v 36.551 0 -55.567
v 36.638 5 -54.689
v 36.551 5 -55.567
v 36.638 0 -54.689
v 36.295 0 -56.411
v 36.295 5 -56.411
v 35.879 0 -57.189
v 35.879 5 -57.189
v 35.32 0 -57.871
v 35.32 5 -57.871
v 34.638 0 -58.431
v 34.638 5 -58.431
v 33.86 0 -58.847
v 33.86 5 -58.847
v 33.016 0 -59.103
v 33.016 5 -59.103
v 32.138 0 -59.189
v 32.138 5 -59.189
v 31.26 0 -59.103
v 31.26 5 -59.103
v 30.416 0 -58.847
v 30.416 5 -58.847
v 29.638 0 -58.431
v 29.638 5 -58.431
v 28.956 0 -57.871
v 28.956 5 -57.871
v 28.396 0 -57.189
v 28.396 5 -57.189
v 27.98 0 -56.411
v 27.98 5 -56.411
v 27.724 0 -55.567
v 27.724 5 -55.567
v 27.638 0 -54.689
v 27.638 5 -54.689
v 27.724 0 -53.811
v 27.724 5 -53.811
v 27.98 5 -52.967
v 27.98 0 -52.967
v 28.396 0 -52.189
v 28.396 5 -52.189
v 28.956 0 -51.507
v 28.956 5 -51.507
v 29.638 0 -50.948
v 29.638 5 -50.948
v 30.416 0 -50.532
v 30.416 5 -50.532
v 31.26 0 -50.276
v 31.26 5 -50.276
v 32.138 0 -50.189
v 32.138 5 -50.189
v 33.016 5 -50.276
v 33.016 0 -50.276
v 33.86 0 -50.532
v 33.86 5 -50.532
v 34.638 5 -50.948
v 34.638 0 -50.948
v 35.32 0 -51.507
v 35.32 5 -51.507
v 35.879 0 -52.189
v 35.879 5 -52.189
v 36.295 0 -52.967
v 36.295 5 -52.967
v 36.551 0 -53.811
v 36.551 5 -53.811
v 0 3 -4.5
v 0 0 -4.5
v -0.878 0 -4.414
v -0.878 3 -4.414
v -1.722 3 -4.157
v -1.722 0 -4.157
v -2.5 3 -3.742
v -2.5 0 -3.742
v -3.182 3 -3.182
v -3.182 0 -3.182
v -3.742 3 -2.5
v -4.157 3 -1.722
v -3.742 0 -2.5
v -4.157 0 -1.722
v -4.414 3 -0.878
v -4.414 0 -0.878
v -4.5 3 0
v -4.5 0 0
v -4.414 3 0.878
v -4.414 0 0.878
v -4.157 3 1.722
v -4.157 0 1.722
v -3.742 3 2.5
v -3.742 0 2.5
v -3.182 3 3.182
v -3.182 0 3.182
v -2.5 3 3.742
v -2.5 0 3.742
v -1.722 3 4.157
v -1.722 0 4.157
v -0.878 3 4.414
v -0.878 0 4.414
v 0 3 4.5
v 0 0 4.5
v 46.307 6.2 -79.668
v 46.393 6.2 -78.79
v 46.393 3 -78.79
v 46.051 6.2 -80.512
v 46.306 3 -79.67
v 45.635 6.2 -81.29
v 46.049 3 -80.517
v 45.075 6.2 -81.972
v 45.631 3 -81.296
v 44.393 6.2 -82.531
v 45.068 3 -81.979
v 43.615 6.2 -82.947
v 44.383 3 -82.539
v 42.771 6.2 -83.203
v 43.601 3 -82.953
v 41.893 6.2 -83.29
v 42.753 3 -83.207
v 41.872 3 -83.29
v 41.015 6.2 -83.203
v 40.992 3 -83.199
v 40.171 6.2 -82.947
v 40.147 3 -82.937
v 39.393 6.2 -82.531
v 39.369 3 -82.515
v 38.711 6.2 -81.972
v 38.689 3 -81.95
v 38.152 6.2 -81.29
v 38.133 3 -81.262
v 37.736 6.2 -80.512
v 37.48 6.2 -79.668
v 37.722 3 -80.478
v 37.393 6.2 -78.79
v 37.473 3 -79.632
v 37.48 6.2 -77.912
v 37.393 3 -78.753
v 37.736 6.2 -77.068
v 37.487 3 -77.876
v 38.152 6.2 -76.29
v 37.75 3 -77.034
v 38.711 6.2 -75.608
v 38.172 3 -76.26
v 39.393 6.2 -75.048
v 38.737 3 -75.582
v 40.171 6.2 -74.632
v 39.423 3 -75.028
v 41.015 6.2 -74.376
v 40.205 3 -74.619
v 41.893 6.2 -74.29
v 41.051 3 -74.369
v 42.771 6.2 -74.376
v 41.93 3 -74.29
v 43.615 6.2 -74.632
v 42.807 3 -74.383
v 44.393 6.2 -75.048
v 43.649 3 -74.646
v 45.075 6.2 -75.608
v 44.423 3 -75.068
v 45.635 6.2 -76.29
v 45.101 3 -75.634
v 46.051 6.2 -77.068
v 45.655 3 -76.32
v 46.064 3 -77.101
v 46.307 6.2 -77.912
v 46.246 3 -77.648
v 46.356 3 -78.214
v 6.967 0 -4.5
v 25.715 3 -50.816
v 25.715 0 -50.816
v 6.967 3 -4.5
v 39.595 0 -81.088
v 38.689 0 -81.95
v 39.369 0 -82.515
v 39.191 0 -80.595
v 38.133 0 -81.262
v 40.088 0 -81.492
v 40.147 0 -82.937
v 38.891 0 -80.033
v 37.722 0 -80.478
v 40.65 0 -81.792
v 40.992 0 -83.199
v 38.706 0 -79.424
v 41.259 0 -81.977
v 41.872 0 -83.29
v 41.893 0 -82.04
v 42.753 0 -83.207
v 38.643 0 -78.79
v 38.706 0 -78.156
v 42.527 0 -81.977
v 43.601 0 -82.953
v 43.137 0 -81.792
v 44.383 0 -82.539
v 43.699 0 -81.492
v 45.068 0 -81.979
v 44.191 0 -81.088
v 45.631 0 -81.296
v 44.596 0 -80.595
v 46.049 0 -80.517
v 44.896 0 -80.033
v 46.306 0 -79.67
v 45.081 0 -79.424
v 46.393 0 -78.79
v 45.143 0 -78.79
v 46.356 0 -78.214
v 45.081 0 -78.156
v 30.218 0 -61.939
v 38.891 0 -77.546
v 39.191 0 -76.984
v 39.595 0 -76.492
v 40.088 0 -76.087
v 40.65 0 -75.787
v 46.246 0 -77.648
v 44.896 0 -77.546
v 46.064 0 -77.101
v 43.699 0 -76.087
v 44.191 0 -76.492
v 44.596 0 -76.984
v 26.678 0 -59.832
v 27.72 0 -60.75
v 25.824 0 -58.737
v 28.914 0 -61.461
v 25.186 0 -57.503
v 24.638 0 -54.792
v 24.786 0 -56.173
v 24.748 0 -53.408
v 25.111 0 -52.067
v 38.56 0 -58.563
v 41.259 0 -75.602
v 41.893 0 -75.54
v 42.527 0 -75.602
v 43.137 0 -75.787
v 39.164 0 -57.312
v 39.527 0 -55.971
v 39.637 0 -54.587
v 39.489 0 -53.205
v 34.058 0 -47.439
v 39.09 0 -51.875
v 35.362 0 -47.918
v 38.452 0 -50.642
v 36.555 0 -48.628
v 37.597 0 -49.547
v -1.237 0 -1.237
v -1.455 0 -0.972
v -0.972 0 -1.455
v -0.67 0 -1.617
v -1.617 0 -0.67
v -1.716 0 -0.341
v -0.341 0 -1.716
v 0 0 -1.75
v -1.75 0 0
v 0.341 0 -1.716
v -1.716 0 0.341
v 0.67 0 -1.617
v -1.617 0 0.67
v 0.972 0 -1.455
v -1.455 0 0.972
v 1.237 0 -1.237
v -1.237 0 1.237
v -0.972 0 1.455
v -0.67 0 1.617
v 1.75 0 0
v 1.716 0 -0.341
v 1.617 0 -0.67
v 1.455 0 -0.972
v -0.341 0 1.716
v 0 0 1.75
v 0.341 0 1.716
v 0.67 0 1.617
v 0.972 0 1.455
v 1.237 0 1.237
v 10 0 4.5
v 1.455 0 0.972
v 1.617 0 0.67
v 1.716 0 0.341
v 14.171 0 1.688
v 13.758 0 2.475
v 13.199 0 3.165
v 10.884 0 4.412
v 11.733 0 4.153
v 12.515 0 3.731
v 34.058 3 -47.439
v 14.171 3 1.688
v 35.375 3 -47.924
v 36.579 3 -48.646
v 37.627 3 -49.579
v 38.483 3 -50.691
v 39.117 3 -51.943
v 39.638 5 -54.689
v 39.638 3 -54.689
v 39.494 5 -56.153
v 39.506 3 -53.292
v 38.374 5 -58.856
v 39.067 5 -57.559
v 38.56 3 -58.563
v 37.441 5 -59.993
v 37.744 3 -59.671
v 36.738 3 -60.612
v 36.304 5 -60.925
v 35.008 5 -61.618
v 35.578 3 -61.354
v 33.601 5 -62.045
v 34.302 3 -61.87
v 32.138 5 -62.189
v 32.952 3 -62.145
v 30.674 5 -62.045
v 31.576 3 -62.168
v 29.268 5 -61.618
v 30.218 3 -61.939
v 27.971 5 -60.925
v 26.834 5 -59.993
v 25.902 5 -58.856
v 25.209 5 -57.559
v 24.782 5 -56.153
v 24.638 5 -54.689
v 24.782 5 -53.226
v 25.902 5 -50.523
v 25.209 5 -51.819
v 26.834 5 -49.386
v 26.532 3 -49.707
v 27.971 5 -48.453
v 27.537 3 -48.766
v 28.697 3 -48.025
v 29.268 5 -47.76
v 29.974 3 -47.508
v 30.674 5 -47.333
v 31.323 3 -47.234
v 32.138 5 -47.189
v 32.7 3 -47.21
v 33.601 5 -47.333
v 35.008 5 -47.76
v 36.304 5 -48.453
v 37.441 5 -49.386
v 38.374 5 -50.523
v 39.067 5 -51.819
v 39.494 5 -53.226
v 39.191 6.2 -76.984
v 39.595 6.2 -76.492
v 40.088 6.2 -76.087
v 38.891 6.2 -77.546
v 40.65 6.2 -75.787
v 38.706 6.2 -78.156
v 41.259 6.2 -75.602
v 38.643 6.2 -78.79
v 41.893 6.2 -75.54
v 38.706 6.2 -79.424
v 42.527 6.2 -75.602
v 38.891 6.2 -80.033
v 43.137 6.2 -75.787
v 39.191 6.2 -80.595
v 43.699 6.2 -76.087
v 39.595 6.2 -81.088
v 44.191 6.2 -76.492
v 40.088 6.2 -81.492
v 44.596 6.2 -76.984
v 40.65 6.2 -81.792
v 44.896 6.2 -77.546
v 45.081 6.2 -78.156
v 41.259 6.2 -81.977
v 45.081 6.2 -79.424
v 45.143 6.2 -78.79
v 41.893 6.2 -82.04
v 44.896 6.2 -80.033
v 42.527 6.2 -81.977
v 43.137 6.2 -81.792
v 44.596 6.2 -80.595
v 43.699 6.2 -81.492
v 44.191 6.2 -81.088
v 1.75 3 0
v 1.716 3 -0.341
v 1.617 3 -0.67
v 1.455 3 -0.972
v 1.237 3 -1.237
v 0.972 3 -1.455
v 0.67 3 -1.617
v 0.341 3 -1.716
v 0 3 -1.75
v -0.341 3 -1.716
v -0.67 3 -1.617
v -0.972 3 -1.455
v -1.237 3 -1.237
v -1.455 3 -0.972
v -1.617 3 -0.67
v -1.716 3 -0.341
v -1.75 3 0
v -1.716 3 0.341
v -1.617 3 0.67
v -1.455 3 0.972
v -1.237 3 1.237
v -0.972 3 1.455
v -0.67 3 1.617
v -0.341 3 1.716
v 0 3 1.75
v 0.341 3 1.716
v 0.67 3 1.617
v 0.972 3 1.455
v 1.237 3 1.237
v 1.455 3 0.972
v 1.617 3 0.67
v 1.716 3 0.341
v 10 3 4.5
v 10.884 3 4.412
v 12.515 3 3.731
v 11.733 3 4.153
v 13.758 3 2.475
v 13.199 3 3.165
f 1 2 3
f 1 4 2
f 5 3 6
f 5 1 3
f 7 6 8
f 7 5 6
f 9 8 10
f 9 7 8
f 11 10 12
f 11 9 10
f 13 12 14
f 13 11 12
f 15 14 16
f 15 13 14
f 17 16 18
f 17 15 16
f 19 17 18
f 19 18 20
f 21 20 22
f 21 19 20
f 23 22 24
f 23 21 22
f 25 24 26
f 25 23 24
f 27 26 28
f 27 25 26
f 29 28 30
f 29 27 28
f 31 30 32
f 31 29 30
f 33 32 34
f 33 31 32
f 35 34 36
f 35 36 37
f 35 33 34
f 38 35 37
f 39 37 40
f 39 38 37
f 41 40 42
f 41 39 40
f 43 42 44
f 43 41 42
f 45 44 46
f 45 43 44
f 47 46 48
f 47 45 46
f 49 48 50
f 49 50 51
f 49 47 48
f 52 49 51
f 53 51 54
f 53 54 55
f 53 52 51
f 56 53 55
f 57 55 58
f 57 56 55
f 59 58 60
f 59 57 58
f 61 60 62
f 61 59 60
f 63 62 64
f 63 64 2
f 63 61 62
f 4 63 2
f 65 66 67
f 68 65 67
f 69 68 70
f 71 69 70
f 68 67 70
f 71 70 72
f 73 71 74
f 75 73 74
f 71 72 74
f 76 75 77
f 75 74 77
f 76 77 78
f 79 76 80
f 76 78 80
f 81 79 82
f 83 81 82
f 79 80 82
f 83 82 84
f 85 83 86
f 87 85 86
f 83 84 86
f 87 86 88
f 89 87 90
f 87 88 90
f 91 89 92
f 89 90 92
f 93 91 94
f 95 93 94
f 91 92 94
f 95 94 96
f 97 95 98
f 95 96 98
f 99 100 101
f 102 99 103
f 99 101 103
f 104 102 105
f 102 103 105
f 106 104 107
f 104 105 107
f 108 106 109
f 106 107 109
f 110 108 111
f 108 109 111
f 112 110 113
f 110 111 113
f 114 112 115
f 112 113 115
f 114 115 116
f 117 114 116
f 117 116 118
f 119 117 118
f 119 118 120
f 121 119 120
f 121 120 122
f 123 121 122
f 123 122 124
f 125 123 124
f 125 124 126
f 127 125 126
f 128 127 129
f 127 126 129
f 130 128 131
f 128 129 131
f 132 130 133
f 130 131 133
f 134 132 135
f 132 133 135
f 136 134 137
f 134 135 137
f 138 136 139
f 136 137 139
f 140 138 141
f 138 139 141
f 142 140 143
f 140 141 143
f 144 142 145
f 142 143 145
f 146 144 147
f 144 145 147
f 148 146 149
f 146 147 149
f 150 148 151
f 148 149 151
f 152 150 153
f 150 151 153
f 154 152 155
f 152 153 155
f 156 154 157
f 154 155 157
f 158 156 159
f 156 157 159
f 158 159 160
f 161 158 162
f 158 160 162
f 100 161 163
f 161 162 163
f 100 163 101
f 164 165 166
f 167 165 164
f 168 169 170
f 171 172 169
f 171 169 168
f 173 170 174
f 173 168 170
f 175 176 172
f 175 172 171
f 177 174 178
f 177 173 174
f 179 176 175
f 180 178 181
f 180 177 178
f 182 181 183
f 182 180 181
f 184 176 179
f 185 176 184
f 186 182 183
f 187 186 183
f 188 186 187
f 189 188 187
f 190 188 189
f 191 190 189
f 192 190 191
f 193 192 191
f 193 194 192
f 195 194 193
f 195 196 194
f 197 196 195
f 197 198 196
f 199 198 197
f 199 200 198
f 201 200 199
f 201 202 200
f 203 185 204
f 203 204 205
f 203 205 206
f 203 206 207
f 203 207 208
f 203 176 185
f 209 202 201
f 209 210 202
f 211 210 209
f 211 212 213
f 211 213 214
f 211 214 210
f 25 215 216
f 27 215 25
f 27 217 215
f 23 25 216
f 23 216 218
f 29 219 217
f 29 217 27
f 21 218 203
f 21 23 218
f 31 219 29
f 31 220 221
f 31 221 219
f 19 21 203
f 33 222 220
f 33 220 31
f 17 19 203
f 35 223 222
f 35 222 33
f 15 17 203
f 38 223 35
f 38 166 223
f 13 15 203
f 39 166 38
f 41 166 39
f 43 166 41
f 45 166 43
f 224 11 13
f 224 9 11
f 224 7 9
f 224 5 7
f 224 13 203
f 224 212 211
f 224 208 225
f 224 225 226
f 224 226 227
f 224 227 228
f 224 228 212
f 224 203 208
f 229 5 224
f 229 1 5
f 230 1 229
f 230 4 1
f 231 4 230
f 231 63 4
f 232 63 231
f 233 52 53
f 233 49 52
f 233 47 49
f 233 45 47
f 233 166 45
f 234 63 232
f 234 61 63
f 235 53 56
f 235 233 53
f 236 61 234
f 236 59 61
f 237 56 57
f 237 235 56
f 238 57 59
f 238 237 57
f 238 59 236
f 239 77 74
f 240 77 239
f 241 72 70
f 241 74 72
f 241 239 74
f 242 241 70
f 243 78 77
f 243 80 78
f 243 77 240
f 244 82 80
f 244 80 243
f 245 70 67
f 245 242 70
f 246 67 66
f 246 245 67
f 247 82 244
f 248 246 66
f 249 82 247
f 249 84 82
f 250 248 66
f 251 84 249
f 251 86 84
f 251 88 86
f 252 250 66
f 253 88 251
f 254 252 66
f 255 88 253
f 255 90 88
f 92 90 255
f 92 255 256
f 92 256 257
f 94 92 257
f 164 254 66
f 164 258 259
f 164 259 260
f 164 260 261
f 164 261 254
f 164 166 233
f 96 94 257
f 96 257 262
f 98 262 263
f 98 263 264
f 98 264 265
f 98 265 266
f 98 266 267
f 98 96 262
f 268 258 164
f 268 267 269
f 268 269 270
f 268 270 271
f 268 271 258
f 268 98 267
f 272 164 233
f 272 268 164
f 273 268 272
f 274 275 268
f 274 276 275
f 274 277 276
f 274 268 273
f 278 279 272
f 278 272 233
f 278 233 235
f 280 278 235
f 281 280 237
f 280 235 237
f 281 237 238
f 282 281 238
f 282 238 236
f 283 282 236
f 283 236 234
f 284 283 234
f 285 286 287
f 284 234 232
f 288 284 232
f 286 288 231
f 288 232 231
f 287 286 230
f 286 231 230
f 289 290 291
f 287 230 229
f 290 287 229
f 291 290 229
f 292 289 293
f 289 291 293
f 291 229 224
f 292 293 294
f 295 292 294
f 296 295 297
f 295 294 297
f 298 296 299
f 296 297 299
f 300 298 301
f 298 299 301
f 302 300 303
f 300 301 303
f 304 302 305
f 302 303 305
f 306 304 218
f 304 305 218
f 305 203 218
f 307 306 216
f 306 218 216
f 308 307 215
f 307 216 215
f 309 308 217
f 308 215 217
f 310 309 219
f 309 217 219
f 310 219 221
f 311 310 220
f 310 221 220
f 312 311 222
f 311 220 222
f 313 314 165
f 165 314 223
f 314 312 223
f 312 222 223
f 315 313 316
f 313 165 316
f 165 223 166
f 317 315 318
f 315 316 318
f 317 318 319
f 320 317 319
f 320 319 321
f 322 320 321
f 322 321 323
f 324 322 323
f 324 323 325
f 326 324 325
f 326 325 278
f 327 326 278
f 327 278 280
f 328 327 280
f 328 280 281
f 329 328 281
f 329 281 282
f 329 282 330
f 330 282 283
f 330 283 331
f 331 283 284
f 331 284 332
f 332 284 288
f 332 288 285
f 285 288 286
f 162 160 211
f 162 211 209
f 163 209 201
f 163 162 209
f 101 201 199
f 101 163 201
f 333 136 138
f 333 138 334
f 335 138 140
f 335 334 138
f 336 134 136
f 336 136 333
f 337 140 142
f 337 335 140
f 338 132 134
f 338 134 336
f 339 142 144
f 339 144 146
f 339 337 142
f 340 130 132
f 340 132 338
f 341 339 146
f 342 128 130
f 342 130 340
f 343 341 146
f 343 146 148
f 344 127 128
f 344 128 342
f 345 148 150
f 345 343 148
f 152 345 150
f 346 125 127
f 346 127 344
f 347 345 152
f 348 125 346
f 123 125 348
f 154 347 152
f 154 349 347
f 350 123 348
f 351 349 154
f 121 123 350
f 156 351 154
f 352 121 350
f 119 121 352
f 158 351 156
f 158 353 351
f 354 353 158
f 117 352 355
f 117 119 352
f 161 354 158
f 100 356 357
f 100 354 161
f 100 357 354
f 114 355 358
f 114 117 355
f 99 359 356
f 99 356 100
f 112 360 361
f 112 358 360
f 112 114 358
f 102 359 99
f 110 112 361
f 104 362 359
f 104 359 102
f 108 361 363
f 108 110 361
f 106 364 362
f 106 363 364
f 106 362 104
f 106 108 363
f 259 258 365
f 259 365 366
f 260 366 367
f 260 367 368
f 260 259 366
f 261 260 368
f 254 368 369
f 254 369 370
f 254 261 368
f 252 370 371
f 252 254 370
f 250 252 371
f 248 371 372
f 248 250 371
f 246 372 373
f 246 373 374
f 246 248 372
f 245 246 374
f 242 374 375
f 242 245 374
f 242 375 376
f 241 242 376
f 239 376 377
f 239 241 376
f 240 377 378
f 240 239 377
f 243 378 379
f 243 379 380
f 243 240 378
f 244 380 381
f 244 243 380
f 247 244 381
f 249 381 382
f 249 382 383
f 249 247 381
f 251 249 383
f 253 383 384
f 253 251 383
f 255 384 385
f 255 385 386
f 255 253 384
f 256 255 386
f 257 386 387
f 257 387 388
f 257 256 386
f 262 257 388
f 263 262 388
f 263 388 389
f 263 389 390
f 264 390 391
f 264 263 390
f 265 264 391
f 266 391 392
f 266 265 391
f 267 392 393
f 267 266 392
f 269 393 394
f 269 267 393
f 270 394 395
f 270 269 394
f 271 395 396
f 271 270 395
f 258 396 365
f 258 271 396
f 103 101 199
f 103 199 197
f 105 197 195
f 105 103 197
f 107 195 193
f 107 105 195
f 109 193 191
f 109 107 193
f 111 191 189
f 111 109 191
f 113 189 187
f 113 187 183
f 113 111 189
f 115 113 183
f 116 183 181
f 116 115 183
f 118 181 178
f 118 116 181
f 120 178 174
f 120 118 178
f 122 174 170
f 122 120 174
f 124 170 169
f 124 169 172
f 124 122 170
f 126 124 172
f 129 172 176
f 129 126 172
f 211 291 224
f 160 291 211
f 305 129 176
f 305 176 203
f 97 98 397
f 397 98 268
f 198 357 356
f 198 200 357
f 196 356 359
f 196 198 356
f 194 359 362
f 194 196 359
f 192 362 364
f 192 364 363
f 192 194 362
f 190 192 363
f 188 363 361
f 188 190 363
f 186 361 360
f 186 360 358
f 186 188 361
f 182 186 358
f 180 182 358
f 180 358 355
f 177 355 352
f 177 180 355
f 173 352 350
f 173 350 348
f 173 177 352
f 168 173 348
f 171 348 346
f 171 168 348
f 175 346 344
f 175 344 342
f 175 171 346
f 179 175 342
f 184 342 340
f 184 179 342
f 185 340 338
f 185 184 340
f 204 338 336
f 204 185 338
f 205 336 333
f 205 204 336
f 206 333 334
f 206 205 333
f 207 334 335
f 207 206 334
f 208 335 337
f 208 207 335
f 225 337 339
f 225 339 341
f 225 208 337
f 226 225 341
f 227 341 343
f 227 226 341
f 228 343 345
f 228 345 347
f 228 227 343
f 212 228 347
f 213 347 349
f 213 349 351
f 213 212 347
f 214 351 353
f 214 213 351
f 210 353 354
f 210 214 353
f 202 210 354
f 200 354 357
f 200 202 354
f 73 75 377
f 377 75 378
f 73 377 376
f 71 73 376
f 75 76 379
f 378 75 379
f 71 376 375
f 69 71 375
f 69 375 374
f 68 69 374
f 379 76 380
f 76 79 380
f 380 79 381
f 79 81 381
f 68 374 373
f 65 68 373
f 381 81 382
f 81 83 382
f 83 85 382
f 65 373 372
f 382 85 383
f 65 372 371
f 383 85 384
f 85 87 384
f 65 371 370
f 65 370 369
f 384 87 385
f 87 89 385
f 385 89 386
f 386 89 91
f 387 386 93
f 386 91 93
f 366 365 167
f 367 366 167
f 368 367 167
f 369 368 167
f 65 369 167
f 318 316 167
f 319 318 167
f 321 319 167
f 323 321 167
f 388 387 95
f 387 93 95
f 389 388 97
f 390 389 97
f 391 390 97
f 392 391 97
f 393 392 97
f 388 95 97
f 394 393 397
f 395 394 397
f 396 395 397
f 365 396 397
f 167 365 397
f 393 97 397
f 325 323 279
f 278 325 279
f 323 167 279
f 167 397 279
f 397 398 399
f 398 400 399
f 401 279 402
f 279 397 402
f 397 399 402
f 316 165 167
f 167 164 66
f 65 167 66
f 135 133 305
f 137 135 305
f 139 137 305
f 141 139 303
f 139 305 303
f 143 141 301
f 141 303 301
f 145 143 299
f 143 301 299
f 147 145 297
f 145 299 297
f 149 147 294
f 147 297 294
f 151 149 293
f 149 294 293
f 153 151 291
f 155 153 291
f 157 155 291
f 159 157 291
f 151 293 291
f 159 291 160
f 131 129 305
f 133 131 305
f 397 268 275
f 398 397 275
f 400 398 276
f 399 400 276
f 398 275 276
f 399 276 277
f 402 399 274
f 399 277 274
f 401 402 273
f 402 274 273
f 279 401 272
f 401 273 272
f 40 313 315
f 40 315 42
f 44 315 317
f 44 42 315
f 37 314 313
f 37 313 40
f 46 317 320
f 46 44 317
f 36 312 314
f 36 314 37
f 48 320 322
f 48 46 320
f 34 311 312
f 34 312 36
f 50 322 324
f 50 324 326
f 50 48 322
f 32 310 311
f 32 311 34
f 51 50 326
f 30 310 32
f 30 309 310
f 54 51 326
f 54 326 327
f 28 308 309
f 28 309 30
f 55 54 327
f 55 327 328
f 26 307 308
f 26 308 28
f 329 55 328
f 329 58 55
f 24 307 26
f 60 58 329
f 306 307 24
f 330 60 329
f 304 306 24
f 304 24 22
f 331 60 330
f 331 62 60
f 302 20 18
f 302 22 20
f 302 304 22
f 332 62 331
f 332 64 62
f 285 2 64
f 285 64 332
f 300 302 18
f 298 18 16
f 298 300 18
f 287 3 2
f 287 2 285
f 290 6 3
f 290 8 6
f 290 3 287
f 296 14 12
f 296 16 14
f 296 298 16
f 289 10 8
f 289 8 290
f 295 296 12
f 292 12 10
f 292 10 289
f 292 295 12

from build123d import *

# Parameters (mm, degrees)
SKETCH1_R           = 1.75
BOSS_EXTRUDE1_DEPTH = 3
BOSS_EXTRUDE2_DEPTH = 3
SKETCH3_R           = 4.5
SKETCH3_R_2         = 3.25
BOSS_EXTRUDE3_DEPTH = 3.2
SKETCH4_R           = 3.25
CUT_EXTRUDE1_DEPTH  = 3
SKETCH6_R           = 7.5
BOSS_EXTRUDE4_DEPTH = 3
SKETCH5_R           = 4.5
CUT_EXTRUDE2_DEPTH  = 7.2
SKETCH7_R           = 7.5
SKETCH7_R_2         = 4.5
BOSS_EXTRUDE5_DEPTH = 2


with BuildPart() as part:
    # Sketch1 → Boss-Extrude1 (new body)
    with BuildSketch(Plane(origin=(0, 0, 0), x_dir=(1, 0, 0), z_dir=(0, 1, 0))):
        with BuildLine():
            Line((0, -4.5), (10, -4.5))
            ThreePointArc((10, -4.5), (14.5, 0), (10, 4.5))
            Line((10, 4.5), (0, 4.5))
            ThreePointArc((0, 4.5), (-4.5, 0), (0, -4.5))
        make_face()
        Circle(SKETCH1_R, mode=Mode.SUBTRACT)
    extrude(amount=BOSS_EXTRUDE1_DEPTH)

    # Sketch2 → Boss-Extrude2 (add)
    with BuildSketch(Plane(origin=(0, 3, 0), x_dir=(1, 0, 0), z_dir=(0, 1, 0))):
        with BuildLine():
            Line((10, 0), (11.688465713, 4.171220869))
            ThreePointArc((11.688465713, 4.171220869), (10.860088975, 4.41704052), (10, 4.5))
            Line((10, 4.5), (6.96685822, 4.5))
            ThreePointArc((6.96685822, 4.5), (8.346615874, -1.181489024), (14.171220869, -1.688465713))
            Line((14.171220869, -1.688465713), (10, 0))
        make_face()
        with BuildLine():
            ThreePointArc((46.064462111, 77.10126181), (43.648814249, 74.646303405), (40.204775529, 74.618506654))
            Line((40.204775529, 74.618506654), (11.688465713, 4.171220869))
            ThreePointArc((11.688465713, 4.171220869), (14.143424118, 1.755573007), (14.171220869, -1.688465713))
            Line((14.171220869, -1.688465713), (46.064462111, 77.10126181))
        make_face()
        with BuildLine():
            ThreePointArc((14.171220869, -1.688465713), (14.143424118, 1.755573007), (11.688465713, 4.171220869))
            Line((11.688465713, 4.171220869), (10, 0))
            Line((10, 0), (14.171220869, -1.688465713))
        make_face()
        with BuildLine():
            Line((11.688465713, 4.171220869), (40.204775529, 74.618506654))
            ThreePointArc((40.204775529, 74.618506654), (37.749817124, 77.034154516), (37.722020373, 80.478193235))
            Line((37.722020373, 80.478193235), (6.96685822, 4.5))
            Line((6.96685822, 4.5), (10, 4.5))
            ThreePointArc((10, 4.5), (10.860088975, 4.41704052), (11.688465713, 4.171220869))
        make_face()
        with BuildLine():
            Line((37.722020373, 80.478193235), (41.893241242, 78.789727523))
            Line((41.893241242, 78.789727523), (46.064462111, 77.10126181))
            ThreePointArc((46.064462111, 77.10126181), (46.310281762, 77.929638548), (46.393241242, 78.789727523))
            ThreePointArc((46.393241242, 78.789727523), (42.753330217, 83.206768043), (37.722020373, 80.478193235))
        make_face()
        with BuildLine():
            Line((46.064462111, 77.10126181), (41.893241242, 78.789727523))
            Line((41.893241242, 78.789727523), (40.204775529, 74.618506654))
            ThreePointArc((40.204775529, 74.618506654), (43.648814249, 74.646303405), (46.064462111, 77.10126181))
        make_face()
        with BuildLine():
            Line((40.204775529, 74.618506654), (41.893241242, 78.789727523))
            Line((41.893241242, 78.789727523), (37.722020373, 80.478193235))
            ThreePointArc((37.722020373, 80.478193235), (37.749817124, 77.034154516), (40.204775529, 74.618506654))
        make_face()
    extrude(amount=-BOSS_EXTRUDE2_DEPTH)

    # Sketch3 → Boss-Extrude3 (add)
    with BuildSketch(Plane(origin=(0, 3, 0), x_dir=(1, 0, 0), z_dir=(0, 1, 0))):
        with Locations((41.893241242, 78.789727523)):
            Circle(SKETCH3_R)
        with Locations((41.893241242, 78.789727523)):
            Circle(SKETCH3_R_2, mode=Mode.SUBTRACT)
    extrude(amount=BOSS_EXTRUDE3_DEPTH)

    # Sketch4 → Cut-Extrude1 (cut)
    with BuildSketch(Plane(origin=(0, 3, 0), x_dir=(1, 0, 0), z_dir=(0, 1, 0))):
        with Locations((41.893241242, 78.789727523)):
            Circle(SKETCH4_R)
    extrude(amount=-CUT_EXTRUDE1_DEPTH, mode=Mode.SUBTRACT)

    # Sketch6 → Boss-Extrude4 (add)
    with BuildSketch(Plane.XZ):
        with Locations((32.137661568, -54.68934028)):
            Circle(SKETCH6_R)
    extrude(amount=-BOSS_EXTRUDE4_DEPTH)

    # Sketch5 → Cut-Extrude2 (cut, through all)
    with BuildSketch(Plane.XZ):
        with Locations((32.137661568, -54.68934028)):
            Circle(SKETCH5_R)
    extrude(amount=-CUT_EXTRUDE2_DEPTH, mode=Mode.SUBTRACT)

    # Sketch7 → Boss-Extrude5 (add)
    with BuildSketch(Plane(origin=(0, 3, 0), x_dir=(1, 0, 0), z_dir=(0, 1, 0))):
        with Locations((32.137661568, 54.68934028)):
            Circle(SKETCH7_R)
        with Locations((32.137661568, 54.68934028)):
            Circle(SKETCH7_R_2, mode=Mode.SUBTRACT)
    extrude(amount=BOSS_EXTRUDE5_DEPTH)


solid = part.part
